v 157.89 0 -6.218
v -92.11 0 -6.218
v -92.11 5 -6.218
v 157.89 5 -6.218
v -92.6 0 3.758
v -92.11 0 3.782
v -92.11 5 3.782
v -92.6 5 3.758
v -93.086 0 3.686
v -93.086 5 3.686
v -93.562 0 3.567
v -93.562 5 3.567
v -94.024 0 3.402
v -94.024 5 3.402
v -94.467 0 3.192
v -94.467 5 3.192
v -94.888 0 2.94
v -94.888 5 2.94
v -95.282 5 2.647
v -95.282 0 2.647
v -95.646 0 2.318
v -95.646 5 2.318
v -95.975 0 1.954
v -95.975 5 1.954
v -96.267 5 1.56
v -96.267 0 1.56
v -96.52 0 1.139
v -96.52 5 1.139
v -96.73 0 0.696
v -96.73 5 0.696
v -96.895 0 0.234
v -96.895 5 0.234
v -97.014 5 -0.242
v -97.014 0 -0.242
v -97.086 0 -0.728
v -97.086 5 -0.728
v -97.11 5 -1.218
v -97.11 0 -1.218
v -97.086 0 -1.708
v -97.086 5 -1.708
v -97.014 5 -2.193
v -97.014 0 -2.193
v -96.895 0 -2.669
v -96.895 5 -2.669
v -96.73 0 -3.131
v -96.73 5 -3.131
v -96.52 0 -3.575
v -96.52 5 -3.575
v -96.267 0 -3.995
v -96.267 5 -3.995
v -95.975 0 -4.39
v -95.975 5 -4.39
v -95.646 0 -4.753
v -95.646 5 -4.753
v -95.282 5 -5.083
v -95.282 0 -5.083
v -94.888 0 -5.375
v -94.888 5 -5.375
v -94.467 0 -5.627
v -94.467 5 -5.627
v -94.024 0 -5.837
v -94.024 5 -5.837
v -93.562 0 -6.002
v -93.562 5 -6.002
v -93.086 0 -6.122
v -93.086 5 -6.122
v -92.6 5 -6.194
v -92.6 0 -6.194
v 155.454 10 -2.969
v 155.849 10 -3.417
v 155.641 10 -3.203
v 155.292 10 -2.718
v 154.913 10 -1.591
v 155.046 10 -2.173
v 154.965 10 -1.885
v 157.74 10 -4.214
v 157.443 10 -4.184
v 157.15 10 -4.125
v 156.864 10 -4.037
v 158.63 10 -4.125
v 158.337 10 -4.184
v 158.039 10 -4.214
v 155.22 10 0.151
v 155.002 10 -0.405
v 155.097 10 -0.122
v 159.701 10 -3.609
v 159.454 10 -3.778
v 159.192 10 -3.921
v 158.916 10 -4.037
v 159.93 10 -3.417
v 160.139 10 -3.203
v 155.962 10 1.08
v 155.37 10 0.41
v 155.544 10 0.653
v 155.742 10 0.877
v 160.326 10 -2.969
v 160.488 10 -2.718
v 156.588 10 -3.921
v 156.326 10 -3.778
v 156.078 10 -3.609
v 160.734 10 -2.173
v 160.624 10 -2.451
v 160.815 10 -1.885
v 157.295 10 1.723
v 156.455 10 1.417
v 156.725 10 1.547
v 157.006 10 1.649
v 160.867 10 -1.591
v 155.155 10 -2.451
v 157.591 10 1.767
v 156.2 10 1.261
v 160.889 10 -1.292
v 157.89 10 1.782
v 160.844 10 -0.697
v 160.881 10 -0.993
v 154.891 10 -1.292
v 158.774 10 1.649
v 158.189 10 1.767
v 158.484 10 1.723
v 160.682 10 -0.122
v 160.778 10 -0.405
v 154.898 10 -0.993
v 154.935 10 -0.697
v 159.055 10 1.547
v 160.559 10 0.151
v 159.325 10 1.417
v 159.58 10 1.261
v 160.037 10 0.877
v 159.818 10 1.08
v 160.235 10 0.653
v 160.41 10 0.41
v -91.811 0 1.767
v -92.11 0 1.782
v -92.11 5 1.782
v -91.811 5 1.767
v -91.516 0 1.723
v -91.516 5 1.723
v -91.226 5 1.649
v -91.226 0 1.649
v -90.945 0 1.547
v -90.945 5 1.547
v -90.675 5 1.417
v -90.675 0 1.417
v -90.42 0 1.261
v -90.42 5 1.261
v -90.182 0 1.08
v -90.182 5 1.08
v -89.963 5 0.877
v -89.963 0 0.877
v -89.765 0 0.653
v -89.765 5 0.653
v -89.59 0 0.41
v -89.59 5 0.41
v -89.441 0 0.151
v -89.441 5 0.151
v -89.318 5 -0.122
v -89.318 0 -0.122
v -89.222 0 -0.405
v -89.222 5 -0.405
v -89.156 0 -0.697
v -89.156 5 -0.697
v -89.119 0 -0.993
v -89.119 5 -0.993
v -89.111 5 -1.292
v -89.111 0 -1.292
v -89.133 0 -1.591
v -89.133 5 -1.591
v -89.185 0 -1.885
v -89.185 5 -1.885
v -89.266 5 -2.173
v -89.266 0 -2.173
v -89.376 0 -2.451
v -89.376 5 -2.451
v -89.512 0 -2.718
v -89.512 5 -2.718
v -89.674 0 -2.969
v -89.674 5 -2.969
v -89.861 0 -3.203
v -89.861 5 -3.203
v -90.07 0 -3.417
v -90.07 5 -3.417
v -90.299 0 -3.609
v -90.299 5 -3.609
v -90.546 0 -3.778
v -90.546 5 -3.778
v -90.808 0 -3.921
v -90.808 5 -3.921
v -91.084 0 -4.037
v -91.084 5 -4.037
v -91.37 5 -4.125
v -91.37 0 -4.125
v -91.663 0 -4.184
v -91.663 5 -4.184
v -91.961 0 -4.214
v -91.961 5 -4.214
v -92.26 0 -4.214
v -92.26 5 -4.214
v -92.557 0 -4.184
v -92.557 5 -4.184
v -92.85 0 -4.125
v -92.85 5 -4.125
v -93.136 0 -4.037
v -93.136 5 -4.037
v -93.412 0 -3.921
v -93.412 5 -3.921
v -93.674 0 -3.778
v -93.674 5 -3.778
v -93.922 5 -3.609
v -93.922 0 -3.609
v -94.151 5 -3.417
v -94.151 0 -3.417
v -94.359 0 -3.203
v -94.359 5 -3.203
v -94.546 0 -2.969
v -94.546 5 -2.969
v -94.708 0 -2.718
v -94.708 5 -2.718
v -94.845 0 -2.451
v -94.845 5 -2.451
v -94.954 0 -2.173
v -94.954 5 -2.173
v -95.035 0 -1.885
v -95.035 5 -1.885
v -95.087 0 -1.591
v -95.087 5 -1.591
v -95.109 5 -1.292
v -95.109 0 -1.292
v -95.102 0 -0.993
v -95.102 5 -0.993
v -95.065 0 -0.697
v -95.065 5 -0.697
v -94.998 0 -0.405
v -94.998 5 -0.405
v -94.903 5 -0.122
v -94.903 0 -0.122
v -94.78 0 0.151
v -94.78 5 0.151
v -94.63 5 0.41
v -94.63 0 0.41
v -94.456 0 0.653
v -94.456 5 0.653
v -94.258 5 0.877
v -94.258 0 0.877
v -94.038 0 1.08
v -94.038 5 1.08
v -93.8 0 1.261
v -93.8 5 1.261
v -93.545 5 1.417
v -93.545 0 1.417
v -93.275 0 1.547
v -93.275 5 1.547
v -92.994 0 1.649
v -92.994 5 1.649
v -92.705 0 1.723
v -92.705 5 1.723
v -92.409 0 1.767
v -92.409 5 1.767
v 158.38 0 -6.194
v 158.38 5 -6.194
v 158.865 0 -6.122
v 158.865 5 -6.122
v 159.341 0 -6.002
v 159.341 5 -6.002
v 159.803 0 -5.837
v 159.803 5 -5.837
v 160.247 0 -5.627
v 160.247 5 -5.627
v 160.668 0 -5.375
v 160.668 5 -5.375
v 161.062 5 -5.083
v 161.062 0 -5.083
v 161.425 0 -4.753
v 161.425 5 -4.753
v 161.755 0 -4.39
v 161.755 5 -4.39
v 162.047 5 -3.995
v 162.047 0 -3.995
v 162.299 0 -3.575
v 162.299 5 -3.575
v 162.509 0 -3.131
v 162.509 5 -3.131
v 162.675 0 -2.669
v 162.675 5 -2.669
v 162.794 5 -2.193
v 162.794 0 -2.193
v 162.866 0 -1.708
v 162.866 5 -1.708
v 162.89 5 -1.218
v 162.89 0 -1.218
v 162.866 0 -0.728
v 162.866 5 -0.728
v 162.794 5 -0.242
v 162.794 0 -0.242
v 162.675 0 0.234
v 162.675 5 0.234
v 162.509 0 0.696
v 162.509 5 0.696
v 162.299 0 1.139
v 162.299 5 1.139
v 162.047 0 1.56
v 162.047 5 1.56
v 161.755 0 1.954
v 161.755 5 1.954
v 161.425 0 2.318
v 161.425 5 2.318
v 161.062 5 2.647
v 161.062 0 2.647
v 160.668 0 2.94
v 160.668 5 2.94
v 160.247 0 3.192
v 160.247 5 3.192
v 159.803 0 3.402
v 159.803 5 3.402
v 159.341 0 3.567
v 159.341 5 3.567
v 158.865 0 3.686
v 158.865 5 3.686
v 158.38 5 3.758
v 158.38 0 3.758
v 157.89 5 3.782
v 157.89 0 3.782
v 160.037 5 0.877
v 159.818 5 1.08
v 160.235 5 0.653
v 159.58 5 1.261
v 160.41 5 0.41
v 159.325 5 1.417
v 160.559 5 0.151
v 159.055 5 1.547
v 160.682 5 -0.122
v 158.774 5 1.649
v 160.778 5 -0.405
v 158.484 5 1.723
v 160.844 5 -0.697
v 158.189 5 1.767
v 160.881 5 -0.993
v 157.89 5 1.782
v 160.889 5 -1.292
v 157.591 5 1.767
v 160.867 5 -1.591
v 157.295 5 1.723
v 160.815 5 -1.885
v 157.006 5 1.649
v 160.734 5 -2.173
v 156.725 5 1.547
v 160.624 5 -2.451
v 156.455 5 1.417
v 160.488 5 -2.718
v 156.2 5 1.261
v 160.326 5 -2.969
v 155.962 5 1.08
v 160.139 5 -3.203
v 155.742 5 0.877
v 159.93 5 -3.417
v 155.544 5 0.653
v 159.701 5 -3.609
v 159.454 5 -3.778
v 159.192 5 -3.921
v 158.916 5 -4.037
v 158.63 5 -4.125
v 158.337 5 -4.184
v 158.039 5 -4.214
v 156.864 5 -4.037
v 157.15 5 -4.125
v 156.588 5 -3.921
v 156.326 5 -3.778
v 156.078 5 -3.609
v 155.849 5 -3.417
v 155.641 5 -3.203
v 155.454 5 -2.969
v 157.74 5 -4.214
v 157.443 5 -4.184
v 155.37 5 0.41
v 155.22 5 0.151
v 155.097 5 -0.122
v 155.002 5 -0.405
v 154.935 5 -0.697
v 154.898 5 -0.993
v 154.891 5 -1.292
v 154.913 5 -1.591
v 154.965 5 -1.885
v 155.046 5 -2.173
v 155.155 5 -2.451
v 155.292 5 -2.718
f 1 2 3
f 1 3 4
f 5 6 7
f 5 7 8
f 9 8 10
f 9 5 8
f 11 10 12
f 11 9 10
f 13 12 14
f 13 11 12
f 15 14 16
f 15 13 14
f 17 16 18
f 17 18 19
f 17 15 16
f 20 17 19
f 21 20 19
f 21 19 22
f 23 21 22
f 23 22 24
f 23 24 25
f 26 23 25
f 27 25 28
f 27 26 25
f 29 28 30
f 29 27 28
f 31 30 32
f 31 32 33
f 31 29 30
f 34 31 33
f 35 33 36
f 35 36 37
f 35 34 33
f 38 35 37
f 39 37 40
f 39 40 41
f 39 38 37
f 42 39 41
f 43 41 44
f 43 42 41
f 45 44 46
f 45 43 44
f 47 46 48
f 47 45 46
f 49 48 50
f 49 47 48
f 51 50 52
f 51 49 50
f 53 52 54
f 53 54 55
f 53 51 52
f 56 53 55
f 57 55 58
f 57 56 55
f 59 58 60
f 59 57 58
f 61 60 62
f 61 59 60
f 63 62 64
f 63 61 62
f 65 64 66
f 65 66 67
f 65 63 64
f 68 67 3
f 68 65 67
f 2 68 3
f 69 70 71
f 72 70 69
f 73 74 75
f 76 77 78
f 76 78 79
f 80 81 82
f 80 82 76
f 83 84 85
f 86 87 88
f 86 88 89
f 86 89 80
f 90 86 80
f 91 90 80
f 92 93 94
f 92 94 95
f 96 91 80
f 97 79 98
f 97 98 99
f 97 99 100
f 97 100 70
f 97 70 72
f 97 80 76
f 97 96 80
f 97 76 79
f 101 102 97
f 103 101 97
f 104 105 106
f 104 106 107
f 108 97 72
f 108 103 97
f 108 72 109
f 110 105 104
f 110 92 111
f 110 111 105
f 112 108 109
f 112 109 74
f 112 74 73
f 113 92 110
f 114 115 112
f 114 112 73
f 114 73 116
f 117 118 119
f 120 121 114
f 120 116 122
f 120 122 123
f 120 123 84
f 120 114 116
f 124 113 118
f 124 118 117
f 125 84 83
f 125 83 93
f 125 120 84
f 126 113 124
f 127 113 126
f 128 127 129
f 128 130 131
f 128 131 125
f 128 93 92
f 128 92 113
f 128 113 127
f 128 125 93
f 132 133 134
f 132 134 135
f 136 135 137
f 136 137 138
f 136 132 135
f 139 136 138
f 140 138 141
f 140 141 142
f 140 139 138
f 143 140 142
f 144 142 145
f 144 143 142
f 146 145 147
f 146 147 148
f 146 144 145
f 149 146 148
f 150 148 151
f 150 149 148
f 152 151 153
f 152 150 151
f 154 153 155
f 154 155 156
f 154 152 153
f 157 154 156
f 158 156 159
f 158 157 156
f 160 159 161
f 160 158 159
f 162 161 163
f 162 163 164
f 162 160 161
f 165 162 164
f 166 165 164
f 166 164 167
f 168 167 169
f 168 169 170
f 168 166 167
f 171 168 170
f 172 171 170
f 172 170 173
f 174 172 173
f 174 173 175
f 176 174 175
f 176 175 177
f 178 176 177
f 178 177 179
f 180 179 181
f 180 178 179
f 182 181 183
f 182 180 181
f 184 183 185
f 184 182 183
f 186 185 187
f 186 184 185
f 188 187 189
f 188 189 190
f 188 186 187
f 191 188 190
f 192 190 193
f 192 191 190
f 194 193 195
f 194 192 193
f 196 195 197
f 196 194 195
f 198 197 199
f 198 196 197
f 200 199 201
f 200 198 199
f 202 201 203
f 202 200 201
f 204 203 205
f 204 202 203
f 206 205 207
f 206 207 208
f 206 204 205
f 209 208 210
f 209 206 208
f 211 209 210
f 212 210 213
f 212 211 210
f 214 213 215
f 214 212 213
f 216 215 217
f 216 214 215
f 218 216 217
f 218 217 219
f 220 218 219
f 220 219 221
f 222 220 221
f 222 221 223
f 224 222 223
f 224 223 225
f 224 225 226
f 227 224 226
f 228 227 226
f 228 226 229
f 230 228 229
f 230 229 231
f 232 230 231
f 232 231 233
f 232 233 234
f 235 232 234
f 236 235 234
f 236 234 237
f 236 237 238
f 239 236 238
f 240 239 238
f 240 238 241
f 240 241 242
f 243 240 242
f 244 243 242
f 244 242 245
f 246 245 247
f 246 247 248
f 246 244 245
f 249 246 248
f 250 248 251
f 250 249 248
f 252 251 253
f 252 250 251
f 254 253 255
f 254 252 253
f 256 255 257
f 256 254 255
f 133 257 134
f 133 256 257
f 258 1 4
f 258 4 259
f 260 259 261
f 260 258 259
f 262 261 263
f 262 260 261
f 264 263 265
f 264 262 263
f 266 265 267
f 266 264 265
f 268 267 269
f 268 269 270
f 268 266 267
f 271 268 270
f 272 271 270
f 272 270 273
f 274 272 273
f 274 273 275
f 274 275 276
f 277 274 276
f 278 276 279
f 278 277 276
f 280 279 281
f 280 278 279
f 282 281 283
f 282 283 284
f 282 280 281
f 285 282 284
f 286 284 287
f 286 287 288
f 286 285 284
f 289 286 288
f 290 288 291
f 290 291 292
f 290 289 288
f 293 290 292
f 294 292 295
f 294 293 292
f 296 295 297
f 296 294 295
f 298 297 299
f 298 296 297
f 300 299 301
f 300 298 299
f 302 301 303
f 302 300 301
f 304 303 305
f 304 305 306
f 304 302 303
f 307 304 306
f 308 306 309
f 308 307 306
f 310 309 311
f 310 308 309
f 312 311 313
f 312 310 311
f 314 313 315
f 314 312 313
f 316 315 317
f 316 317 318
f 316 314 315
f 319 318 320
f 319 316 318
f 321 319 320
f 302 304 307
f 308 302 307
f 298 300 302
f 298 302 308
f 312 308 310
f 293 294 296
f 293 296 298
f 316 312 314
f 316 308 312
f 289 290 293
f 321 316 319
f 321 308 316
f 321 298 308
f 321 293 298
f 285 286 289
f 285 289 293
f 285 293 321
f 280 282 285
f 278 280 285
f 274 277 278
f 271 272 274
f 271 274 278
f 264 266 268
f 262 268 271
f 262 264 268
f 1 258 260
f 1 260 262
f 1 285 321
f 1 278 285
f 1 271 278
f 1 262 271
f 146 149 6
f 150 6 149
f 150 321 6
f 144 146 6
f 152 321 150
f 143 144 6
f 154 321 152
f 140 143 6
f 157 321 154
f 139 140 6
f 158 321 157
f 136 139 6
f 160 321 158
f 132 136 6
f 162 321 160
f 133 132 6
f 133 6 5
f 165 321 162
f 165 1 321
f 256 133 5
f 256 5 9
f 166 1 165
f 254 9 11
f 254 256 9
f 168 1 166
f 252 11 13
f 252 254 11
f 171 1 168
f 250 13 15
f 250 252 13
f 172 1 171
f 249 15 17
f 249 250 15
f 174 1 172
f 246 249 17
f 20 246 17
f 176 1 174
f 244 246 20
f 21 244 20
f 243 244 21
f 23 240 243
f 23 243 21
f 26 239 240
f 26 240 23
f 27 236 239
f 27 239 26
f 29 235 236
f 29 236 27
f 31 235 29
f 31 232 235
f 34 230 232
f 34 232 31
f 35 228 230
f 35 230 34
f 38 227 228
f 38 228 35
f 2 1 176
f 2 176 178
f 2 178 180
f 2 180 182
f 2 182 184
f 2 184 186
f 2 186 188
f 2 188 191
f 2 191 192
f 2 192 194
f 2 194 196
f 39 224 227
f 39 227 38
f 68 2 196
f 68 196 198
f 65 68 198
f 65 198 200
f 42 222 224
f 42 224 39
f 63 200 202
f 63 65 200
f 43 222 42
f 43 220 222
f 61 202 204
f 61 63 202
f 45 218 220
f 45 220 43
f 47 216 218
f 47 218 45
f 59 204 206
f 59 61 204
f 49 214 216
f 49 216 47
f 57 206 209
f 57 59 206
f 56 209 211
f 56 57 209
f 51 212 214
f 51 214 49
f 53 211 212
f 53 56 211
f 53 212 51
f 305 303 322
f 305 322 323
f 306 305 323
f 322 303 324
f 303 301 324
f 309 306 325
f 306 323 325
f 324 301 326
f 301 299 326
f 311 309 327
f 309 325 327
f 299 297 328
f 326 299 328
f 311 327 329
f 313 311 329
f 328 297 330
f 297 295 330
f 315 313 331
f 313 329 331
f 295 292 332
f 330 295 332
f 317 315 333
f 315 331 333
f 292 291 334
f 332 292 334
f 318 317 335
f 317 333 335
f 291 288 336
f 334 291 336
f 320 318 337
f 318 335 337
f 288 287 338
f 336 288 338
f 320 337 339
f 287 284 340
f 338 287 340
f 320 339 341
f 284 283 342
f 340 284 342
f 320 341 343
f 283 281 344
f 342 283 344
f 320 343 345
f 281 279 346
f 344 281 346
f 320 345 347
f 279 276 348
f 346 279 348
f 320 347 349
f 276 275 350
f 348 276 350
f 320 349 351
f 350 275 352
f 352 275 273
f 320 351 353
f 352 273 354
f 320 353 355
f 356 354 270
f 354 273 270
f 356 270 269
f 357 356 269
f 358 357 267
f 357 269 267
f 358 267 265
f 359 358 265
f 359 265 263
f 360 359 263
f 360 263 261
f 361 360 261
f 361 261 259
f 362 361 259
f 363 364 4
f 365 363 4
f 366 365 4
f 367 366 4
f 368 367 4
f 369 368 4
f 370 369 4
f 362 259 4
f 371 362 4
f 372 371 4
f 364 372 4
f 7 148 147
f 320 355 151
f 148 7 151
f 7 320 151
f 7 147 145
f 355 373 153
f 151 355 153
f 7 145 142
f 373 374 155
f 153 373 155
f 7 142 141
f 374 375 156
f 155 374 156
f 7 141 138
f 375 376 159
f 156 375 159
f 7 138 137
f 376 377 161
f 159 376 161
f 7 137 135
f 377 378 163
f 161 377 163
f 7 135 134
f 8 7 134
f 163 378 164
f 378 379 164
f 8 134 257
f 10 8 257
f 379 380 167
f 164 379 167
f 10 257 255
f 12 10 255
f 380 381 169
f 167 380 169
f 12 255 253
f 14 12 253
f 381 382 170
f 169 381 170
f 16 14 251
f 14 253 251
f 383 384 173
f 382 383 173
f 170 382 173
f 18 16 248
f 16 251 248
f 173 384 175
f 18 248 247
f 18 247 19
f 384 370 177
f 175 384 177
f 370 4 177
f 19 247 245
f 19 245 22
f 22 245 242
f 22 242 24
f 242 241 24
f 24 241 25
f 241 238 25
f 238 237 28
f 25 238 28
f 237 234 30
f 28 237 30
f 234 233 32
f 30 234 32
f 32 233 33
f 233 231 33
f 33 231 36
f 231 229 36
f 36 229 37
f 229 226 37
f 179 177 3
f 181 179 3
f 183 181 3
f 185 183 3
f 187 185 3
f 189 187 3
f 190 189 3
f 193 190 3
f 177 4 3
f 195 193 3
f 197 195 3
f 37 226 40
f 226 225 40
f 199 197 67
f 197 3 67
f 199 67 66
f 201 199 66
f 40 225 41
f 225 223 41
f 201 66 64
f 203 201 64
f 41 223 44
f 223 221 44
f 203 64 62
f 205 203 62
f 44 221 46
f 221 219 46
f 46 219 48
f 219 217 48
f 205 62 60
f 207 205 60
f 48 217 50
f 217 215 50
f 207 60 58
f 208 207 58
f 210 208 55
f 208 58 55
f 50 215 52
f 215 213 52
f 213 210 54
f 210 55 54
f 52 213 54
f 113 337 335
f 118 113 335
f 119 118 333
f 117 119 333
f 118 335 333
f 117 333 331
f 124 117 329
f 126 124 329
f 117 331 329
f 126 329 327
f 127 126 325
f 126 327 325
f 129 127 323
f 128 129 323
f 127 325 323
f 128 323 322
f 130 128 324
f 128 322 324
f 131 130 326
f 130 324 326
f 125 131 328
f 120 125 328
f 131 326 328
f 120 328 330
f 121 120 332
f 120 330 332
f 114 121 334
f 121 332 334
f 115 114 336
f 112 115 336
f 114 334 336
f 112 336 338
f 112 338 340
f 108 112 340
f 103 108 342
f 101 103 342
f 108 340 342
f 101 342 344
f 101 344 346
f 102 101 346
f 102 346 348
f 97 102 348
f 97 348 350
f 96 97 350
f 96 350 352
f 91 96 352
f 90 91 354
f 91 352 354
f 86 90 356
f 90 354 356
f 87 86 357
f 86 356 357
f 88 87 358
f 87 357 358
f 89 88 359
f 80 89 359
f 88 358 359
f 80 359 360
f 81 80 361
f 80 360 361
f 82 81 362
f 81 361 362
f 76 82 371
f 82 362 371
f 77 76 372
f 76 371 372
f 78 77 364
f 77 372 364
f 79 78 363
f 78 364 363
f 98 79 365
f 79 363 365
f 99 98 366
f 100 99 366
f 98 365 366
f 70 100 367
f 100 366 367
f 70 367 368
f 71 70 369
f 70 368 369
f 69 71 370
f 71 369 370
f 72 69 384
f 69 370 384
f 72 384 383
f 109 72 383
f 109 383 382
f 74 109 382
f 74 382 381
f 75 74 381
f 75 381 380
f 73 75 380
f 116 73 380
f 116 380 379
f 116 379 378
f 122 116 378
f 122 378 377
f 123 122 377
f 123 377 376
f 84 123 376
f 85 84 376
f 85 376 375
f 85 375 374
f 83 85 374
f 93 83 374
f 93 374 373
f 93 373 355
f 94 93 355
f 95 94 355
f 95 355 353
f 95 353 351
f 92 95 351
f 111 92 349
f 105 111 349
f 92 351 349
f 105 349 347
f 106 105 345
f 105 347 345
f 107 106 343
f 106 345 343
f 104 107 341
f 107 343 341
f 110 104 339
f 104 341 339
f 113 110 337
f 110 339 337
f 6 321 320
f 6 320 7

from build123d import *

# Parameters (mm, degrees)
SKETCH_1_R      = 3
EXTRUDE_1_DEPTH = 5
SKETCH_2_R      = 3
EXTRUDE_2_DEPTH = 5


with BuildPart() as part:
    # 草图1 → 凸台-拉伸1 (new body)
    with BuildSketch(Plane(origin=(0, 0, 0), x_dir=(1, 0, 0), z_dir=(0, 1, 0))):
        with BuildLine():
            Line((-92.110125605, 6.217636835), (157.889874395, 6.217636835))
            ThreePointArc((157.889874395, 6.217636835), (162.889874395, 1.217636835), (157.889874395, -3.782363165))
            Line((157.889874395, -3.782363165), (-92.110125605, -3.782363165))
            ThreePointArc((-92.110125605, -3.782363165), (-97.110125605, 1.217636835), (-92.110125605, 6.217636835))
        make_face()
        with Locations(Location((-92.110125605, 1.217636835, 0), (0, 0, 270))):
            Circle(SKETCH_1_R, mode=Mode.SUBTRACT)
    extrude(amount=EXTRUDE_1_DEPTH)

    # 草图2 → 凸台-拉伸2 (add)
    with BuildSketch(Plane(origin=(0, 5, 0), x_dir=(1, 0, 0), z_dir=(0, 1, 0))):
        with Locations(Location((157.889874395, 1.217636835, 0), (0, 0, 270))):
            Circle(SKETCH_2_R)
    extrude(amount=EXTRUDE_2_DEPTH)


solid = part.part
